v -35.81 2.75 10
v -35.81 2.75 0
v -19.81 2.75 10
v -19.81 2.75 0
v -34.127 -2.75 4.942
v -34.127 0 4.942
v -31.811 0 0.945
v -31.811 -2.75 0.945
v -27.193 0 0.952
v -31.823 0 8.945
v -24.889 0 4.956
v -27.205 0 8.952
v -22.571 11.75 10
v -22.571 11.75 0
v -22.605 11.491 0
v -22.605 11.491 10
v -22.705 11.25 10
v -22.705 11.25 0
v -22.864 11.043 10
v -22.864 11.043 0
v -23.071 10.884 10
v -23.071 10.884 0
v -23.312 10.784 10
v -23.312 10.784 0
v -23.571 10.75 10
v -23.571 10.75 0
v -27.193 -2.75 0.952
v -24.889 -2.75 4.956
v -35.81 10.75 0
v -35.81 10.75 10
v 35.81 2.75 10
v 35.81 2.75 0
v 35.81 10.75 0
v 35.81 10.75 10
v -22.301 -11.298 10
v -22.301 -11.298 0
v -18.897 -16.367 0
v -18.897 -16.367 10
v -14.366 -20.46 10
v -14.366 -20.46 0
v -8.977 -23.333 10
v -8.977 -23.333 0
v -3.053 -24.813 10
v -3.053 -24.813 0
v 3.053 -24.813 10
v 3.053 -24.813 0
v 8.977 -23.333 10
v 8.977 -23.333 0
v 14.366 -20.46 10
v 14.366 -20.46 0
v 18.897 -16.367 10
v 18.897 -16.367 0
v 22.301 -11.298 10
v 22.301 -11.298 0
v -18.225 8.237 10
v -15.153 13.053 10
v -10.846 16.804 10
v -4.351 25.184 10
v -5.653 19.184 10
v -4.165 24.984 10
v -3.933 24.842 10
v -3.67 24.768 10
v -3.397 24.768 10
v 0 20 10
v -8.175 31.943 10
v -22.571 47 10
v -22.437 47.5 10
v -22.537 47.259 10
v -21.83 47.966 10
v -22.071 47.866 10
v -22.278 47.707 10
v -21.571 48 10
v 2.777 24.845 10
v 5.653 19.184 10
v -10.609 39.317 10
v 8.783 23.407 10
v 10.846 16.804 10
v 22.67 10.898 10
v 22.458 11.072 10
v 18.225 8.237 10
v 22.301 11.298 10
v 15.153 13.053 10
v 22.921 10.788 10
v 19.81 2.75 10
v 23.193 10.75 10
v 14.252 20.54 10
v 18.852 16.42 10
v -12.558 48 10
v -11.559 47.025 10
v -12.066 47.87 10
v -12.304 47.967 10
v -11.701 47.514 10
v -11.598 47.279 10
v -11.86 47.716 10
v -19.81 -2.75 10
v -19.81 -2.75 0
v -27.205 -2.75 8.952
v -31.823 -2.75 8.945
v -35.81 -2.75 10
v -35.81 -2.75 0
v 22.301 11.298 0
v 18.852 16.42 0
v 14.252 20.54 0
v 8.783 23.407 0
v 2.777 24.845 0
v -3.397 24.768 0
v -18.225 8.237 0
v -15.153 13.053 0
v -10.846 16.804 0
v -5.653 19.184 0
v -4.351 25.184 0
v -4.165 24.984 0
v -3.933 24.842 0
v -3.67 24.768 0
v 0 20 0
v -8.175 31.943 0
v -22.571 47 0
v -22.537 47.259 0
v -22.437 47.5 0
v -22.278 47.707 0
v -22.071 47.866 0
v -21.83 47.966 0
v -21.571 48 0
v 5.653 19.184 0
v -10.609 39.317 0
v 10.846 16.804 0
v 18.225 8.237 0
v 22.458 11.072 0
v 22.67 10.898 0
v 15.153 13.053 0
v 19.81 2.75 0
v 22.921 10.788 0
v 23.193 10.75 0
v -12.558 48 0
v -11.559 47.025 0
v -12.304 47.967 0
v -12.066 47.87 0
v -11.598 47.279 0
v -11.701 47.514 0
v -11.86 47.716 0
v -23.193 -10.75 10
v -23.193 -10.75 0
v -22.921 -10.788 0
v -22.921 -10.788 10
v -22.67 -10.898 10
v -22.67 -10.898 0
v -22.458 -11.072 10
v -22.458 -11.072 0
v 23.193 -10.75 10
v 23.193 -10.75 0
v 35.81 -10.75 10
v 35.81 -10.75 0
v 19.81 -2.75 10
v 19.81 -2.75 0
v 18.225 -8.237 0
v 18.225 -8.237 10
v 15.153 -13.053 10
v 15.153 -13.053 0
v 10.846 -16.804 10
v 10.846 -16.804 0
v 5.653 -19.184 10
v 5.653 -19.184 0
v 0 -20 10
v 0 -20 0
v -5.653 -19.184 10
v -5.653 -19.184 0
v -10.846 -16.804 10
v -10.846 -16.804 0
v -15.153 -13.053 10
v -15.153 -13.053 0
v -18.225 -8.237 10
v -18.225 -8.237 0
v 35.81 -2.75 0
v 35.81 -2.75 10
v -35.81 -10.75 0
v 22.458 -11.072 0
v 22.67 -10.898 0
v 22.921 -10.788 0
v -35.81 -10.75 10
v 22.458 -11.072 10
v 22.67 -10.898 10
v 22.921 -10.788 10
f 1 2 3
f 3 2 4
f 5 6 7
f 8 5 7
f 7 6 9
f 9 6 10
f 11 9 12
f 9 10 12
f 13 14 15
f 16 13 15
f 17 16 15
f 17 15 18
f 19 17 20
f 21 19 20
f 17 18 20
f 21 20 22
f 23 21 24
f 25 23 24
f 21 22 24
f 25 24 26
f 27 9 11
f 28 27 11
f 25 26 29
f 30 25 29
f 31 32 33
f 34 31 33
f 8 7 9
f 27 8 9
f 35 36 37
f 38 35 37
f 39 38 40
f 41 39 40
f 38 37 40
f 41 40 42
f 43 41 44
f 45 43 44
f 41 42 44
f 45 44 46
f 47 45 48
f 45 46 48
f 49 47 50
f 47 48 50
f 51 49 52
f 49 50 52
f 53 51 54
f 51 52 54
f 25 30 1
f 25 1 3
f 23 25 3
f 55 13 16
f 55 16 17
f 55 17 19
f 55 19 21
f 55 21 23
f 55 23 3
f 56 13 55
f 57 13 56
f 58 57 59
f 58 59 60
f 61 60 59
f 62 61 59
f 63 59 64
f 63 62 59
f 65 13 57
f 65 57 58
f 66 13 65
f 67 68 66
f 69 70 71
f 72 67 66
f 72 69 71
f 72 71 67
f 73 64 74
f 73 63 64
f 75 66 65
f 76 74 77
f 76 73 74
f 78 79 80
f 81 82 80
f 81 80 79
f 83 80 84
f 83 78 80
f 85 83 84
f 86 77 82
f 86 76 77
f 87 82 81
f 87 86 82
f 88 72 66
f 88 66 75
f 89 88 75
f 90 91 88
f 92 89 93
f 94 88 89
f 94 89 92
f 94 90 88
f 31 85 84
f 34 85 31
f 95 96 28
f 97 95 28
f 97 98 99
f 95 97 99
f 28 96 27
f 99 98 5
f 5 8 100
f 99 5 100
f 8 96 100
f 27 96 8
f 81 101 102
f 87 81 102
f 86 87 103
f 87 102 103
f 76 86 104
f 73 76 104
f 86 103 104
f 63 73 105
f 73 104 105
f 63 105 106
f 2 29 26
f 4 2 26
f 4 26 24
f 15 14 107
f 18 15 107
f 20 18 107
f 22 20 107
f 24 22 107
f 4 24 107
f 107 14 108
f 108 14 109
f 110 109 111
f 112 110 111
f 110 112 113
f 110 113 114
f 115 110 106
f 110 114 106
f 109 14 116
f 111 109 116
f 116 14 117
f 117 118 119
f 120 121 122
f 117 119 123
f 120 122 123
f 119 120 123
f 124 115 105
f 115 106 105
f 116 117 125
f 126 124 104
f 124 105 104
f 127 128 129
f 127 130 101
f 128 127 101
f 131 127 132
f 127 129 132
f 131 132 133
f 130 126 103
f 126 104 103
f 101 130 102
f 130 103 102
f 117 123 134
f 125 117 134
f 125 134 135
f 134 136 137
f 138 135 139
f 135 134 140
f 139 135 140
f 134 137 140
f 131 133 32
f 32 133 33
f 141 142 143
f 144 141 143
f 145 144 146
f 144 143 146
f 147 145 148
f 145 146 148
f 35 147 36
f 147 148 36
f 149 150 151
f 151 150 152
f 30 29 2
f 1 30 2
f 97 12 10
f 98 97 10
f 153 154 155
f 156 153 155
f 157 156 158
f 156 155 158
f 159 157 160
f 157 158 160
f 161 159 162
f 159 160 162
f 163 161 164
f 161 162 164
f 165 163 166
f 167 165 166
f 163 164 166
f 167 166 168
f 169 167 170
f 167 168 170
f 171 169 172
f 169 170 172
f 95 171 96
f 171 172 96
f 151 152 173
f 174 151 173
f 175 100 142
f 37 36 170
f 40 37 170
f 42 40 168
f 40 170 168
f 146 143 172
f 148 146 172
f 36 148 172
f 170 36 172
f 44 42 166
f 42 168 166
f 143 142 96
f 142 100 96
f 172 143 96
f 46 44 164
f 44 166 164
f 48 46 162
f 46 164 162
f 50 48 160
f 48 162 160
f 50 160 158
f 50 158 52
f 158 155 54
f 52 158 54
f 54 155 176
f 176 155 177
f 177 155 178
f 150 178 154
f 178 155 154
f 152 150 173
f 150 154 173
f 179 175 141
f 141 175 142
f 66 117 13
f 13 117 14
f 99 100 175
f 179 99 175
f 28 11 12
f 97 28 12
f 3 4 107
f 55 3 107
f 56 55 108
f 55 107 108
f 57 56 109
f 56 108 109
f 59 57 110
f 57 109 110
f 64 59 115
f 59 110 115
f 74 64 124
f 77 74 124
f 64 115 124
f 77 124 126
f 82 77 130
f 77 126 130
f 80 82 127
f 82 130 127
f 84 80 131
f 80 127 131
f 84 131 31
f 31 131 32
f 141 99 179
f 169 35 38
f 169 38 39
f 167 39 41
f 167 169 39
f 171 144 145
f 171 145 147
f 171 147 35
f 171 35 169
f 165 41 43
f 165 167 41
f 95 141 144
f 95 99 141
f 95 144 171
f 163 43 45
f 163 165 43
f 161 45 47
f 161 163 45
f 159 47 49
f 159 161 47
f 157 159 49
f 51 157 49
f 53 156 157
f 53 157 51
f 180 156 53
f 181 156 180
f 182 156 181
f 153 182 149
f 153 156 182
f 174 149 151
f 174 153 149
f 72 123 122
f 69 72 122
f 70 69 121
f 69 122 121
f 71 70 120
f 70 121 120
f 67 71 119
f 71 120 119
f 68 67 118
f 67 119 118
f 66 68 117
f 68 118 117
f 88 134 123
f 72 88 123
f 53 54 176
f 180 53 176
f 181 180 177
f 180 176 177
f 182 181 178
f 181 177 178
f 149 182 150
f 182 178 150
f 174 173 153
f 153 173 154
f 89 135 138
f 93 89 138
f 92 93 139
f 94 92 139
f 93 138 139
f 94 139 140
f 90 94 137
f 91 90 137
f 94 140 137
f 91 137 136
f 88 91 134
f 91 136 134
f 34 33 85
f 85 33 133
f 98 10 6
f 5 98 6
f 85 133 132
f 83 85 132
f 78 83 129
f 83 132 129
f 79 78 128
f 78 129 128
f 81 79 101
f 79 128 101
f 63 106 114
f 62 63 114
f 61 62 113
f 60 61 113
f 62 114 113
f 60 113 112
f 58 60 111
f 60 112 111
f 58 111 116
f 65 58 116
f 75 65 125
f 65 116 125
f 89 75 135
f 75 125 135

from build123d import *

# Parameters (mm, degrees)
F1_DEPTH = 10
F3_DEPTH = 3.5


with BuildPart() as f1:
    # F0 (on Top) → F1 (new body)
    with BuildSketch(Plane.XY):
        with BuildLine():
            ThreePointArc((-19.810035, 2.75), (0, 20), (19.810035, 2.75))
            Line((19.810035, 2.75), (24.84829, 2.75))
            Line((24.84829, 2.75), (35.810035, 2.75))
            Line((35.810035, 2.75), (35.810035, 10.75))
            Line((35.810035, 10.75), (23.19348, 10.75))
            ThreePointArc((23.19348, 10.75), (22.669993, 10.897966), (22.301423, 11.298077))
            ThreePointArc((22.301423, 11.298077), (11.606106, 22.142681), (-3.397308, 24.76809))
            ThreePointArc((-3.397308, 24.76809), (-3.932535, 24.842008), (-4.351183, 25.183571))
            ThreePointArc((-4.351183, 25.183571), (-9.572791, 35.570195), (-11.558727, 47.024592))
            ThreePointArc((-11.558727, 47.024592), (-11.860066, 47.715748), (-12.558424, 48))
            Line((-12.558424, 48), (-21.570722, 48))
            ThreePointArc((-21.570722, 48), (-22.277829, 47.707107), (-22.570722, 47))
            Line((-22.570722, 47), (-22.570722, 11.75))
            ThreePointArc((-22.570722, 11.75), (-22.863615, 11.042893), (-23.570722, 10.75))
            Line((-23.570722, 10.75), (-35.810035, 10.75))
            Line((-35.810035, 10.75), (-35.810035, 2.75))
            Line((-35.810035, 2.75), (-24.84829, 2.75))
            Line((-24.84829, 2.75), (-19.810035, 2.75))
        make_face()
        with BuildLine():
            ThreePointArc((19.810035, -2.75), (0, -20), (-19.810035, -2.75))
            Line((-19.810035, -2.75), (-24.84829, -2.75))
            Line((-24.84829, -2.75), (-35.810035, -2.75))
            Line((-35.810035, -2.75), (-35.810035, -10.75))
            Line((-35.810035, -10.75), (-23.19348, -10.75))
            ThreePointArc((-23.19348, -10.75), (-22.669993, -10.897966), (-22.301423, -11.298077))
            ThreePointArc((-22.301423, -11.298077), (0, -25), (22.301423, -11.298077))
            ThreePointArc((22.301423, -11.298077), (22.669993, -10.897966), (23.19348, -10.75))
            Line((23.19348, -10.75), (35.810035, -10.75))
            Line((35.810035, -10.75), (35.810035, -2.75))
            Line((35.810035, -2.75), (24.84829, -2.75))
            Line((24.84829, -2.75), (19.810035, -2.75))
        make_face()
    extrude(amount=F1_DEPTH)

    # F2 (on Front) → F3 (join)
    with BuildSketch(Plane.XZ):
        Polygon((-31.823415, 8.945243), (-34.126784, 4.941767), (-31.811356, 0.945252), (-27.192559, 0.952215), (-24.88919, 4.955691), (-27.204618, 8.952205), align=None)
    extrude(amount=F3_DEPTH)


solid = f1.part
